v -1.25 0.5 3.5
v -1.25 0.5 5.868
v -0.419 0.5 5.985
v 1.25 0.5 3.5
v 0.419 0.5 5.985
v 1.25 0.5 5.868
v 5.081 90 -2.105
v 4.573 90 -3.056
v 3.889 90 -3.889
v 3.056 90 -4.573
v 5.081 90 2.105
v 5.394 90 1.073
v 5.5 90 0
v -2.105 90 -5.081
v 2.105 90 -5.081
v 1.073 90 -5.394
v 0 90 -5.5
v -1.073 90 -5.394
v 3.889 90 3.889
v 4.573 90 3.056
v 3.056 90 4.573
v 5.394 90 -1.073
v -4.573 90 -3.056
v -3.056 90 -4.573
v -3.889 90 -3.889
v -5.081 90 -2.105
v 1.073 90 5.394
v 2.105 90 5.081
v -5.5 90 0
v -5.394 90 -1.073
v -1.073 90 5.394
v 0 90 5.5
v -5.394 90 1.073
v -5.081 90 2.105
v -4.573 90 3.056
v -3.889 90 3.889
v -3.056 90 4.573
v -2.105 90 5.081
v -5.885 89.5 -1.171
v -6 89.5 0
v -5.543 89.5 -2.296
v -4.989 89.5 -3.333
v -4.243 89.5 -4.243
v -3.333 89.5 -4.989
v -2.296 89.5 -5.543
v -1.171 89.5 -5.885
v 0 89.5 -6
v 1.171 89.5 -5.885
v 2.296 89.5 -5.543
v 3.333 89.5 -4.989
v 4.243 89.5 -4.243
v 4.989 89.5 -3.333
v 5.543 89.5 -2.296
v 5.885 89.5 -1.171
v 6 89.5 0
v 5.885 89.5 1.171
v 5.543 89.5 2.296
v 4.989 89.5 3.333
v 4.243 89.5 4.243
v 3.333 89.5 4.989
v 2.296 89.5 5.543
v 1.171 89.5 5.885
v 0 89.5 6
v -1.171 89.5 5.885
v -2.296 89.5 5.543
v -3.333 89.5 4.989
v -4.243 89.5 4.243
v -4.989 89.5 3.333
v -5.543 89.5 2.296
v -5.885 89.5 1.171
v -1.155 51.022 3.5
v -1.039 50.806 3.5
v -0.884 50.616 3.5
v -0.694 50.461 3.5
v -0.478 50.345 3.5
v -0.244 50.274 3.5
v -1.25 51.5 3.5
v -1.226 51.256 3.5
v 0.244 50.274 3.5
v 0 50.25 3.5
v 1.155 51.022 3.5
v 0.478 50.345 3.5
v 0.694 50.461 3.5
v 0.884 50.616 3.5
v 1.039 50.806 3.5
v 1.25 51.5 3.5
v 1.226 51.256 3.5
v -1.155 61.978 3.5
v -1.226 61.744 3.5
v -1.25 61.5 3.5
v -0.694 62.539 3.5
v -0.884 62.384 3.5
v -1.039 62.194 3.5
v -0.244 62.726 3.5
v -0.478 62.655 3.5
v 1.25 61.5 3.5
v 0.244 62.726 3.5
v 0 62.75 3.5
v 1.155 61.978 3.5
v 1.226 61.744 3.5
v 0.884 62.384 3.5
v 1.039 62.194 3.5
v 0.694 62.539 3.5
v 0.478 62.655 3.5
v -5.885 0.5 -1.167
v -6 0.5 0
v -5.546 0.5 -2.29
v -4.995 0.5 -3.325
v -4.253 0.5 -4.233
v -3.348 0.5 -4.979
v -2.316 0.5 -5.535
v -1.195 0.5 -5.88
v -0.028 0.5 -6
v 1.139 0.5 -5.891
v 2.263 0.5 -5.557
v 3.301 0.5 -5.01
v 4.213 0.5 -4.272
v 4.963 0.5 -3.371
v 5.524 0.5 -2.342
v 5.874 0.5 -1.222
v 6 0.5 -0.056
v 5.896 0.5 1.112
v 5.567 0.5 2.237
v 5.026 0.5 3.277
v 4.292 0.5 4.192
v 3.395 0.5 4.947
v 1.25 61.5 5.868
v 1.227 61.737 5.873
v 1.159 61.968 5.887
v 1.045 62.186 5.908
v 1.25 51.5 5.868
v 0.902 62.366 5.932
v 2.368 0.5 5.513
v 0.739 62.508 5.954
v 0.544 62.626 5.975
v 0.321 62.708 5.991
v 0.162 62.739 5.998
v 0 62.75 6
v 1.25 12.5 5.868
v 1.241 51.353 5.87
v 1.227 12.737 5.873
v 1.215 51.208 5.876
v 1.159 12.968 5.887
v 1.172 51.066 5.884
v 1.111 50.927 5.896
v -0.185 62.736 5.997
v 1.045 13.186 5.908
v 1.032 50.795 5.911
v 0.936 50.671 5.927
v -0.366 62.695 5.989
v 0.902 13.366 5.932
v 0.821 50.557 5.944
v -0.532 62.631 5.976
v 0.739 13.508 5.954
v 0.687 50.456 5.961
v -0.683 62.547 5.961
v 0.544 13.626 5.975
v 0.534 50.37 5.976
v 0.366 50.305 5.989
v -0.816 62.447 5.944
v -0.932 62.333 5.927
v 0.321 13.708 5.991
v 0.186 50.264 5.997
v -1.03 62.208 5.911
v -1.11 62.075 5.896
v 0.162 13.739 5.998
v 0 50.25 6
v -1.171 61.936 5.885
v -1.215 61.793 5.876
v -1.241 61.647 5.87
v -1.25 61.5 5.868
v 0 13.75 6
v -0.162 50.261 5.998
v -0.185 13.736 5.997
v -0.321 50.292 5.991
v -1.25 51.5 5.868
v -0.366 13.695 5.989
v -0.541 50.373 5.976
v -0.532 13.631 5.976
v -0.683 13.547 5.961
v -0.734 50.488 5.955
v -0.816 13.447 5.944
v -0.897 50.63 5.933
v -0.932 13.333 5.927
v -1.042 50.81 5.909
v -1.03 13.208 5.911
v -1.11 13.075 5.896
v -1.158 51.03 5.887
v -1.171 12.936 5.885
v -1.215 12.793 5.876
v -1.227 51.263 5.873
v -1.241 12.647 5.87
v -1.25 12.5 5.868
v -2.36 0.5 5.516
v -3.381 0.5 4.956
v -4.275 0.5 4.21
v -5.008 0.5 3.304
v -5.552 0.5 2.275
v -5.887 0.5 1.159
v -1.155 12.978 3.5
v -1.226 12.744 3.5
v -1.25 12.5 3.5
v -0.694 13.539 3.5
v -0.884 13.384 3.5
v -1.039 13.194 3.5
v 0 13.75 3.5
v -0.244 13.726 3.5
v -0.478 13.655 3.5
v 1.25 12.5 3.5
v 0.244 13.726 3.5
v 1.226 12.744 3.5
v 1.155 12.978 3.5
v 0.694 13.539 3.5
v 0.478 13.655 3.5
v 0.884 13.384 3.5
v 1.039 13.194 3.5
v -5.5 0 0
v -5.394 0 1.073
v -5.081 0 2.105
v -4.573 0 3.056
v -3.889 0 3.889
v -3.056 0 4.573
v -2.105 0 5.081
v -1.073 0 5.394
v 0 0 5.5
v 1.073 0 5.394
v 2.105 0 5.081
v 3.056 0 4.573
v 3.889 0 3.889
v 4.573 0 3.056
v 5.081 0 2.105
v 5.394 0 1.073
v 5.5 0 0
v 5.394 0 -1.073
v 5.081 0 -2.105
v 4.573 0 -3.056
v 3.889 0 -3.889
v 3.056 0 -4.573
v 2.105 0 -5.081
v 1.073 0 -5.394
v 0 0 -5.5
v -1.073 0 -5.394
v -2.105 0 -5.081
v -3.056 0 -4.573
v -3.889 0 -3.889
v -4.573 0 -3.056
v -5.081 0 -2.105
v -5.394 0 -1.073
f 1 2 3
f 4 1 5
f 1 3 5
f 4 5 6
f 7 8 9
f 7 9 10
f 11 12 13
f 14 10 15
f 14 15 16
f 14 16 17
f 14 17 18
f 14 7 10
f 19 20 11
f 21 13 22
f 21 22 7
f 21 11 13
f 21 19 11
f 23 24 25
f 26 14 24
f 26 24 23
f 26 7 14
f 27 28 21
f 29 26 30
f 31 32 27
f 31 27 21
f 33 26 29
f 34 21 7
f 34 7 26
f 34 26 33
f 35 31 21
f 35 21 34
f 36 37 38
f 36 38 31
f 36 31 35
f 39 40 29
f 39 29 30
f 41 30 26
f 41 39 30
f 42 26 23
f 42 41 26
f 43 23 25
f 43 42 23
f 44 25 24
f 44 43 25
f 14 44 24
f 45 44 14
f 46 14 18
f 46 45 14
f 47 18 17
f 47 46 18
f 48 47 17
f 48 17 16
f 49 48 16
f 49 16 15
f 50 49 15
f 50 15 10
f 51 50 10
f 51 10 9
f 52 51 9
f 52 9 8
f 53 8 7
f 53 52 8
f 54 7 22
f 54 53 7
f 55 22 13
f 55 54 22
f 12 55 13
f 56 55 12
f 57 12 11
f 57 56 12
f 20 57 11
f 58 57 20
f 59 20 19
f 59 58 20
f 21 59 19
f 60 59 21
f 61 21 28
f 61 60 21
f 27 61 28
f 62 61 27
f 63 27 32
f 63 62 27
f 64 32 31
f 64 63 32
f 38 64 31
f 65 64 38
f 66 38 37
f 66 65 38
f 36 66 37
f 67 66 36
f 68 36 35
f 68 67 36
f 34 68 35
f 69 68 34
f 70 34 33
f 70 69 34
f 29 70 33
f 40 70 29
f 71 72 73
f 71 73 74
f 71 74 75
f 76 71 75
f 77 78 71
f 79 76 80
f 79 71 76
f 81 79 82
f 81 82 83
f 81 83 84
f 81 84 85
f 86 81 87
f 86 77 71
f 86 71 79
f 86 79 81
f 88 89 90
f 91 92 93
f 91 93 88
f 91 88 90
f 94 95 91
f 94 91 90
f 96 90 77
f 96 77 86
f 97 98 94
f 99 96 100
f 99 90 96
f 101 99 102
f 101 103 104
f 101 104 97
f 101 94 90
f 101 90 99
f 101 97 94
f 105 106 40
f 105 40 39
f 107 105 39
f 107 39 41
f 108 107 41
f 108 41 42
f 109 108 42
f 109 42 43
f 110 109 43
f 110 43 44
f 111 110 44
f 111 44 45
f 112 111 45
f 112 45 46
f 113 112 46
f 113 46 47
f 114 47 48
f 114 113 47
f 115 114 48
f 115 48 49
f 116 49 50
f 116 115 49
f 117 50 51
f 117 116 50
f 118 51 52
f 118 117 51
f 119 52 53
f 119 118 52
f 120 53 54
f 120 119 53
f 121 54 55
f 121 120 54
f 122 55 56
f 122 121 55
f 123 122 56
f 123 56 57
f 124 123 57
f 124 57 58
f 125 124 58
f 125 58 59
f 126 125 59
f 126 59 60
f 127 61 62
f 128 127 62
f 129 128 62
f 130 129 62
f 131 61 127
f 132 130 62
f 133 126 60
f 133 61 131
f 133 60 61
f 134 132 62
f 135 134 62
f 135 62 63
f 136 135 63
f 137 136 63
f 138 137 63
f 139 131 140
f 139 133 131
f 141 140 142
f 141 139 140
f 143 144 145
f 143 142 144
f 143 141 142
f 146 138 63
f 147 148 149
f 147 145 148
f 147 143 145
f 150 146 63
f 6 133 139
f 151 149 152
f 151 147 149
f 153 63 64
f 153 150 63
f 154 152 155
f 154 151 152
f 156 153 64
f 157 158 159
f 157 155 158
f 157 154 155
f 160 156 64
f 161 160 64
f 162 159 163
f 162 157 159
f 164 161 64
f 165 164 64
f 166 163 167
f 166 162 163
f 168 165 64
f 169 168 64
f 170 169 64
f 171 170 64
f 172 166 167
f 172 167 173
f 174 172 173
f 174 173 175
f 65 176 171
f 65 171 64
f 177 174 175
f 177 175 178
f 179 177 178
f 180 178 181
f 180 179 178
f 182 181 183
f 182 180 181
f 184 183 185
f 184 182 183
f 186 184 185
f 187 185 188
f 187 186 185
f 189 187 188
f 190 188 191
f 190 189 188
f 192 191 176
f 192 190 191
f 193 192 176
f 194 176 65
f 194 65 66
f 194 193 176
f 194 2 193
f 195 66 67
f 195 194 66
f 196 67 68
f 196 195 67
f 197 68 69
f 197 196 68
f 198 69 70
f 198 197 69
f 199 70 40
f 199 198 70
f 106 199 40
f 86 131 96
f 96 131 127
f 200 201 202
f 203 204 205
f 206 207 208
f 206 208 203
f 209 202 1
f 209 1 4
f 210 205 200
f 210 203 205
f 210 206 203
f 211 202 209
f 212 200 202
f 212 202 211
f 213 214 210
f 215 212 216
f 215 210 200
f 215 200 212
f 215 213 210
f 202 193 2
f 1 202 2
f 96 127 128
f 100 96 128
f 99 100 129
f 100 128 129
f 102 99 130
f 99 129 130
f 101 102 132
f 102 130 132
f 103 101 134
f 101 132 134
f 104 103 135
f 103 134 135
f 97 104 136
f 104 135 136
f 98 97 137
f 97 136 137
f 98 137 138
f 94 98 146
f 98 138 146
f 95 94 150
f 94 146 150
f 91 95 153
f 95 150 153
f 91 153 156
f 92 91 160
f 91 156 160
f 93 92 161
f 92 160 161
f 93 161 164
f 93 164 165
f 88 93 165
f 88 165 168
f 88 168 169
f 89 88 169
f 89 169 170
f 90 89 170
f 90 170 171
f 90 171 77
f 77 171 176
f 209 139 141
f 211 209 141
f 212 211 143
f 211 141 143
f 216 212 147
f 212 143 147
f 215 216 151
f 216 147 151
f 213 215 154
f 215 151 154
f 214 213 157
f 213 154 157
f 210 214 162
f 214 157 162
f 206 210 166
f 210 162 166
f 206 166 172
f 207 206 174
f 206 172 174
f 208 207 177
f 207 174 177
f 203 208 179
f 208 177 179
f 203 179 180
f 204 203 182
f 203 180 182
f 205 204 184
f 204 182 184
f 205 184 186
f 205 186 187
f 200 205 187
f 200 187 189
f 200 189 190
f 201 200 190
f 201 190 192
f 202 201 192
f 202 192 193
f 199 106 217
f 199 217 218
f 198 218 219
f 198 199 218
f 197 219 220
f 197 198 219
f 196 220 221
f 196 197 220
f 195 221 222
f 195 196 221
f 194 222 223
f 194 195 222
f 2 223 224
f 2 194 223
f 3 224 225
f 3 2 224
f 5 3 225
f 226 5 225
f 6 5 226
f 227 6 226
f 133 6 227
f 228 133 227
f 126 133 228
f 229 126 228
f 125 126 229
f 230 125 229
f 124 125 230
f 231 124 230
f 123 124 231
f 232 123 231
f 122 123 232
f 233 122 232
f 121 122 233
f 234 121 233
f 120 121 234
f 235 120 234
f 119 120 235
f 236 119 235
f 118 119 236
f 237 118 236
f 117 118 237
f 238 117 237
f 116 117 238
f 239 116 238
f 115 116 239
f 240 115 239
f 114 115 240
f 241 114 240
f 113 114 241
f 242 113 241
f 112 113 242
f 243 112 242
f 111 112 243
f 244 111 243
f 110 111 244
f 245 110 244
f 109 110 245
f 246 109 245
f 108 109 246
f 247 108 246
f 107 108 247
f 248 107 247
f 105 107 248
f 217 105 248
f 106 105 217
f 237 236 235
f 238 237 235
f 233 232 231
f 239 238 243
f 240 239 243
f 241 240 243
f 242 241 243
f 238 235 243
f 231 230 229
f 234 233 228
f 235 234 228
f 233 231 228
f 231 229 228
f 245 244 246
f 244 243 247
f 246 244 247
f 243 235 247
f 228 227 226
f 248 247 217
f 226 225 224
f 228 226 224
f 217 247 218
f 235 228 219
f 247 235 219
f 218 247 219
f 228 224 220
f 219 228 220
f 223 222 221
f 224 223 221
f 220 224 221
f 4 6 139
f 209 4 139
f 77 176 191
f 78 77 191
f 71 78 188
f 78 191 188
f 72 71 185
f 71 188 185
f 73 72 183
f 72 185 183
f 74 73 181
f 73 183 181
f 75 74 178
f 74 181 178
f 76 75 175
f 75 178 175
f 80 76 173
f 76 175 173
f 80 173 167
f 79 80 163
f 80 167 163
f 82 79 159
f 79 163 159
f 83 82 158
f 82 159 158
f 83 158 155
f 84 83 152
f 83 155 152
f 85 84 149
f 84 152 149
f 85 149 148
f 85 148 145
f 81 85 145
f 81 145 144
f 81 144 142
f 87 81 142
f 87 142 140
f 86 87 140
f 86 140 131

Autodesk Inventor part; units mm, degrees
ref_plane "YZ Plane" through (0, 0, 0) normal (1, 0, 0) x (0, 1, 0)
sketch "Esboço1" plane through (0, 0, 0) normal (0, 1, 0) x (-1, 0, 0)
  circle A0 centre (0, 0) radius 6
  dimension "d0" = 12
extrude "Extrusão1" add sketch "Esboço1" along normal blind 90
chamfer "Chanfro1" distance 0.5 angle 45 1 edges at (6, 90, 0) measured on face at (0.7092, 90, 1.4219)
chamfer "Chanfro2" distance 0.5 angle 45 1 edges at (6, 0, 0) measured on face at (0.7092, 0, 1.4219)
ref_plane "Plano de trabalho1" through (0, 0, -6) normal (0, 0, 1) x (1, 0, 0)
ref_plane "Plano de trabalho2" through (0, 0, 6) normal (0, 0, 1) x (1, 0, 0)
sketch "Esboço2" plane through (0, 0, 6) normal (0, 0, 1) x (1, 0, 0)
  line L0 (6, 89.5) -> (-6, 89.5) construction
  line L1 (6, 89.5) -> (6, 61.5) construction
  line L2 (6, 0.5) -> (6, 89.5) construction
  line L3 (6, 61.5) -> (6, 51.5) construction
  line L4 (6, 0.5) -> (6, 12.5) construction
  line L5 (0, 61.5) -> (0, 51.5) construction
  line L6 (-1.25, 61.5) -> (-1.25, 51.5)
  line L7 (1.25, 51.5) -> (1.25, 61.5)
  arc A0 (1.25, 61.5) -> (-1.25, 61.5) centre (0, 61.5) ccw
  arc A1 (-1.25, 51.5) -> (1.25, 51.5) centre (0, 51.5) ccw
  line L8 (0, 12.5) -> (0, 0.5) construction
  line L9 (-6, 0.5) -> (6, 0.5) projected
  line L10 (-1.25, 12.5) -> (-1.25, 0.5)
  line L11 (1.25, 0.5) -> (1.25, 12.5)
  arc A2 (1.25, 12.5) -> (-1.25, 12.5) centre (0, 12.5) ccw
  arc A3 (-1.25, 0.5) -> (1.25, 0.5) centre (0, 0.5) ccw
  point P0 (0, 0)
  point P1 (0, 56.5)
  point P2 (0, 6.5)
  dimension "d9" = 28
  dimension "d10" = 10
  dimension "d11" = 12
  dimension "d12" = 2.5
  dimension "d13" = 2.5
extrude "Extrusão2" cut sketch "Esboço2" against normal blind 2.5 contours A0 L7 A1 L6 | L10 A2 L11 L9
properties part number "eixo 5"
